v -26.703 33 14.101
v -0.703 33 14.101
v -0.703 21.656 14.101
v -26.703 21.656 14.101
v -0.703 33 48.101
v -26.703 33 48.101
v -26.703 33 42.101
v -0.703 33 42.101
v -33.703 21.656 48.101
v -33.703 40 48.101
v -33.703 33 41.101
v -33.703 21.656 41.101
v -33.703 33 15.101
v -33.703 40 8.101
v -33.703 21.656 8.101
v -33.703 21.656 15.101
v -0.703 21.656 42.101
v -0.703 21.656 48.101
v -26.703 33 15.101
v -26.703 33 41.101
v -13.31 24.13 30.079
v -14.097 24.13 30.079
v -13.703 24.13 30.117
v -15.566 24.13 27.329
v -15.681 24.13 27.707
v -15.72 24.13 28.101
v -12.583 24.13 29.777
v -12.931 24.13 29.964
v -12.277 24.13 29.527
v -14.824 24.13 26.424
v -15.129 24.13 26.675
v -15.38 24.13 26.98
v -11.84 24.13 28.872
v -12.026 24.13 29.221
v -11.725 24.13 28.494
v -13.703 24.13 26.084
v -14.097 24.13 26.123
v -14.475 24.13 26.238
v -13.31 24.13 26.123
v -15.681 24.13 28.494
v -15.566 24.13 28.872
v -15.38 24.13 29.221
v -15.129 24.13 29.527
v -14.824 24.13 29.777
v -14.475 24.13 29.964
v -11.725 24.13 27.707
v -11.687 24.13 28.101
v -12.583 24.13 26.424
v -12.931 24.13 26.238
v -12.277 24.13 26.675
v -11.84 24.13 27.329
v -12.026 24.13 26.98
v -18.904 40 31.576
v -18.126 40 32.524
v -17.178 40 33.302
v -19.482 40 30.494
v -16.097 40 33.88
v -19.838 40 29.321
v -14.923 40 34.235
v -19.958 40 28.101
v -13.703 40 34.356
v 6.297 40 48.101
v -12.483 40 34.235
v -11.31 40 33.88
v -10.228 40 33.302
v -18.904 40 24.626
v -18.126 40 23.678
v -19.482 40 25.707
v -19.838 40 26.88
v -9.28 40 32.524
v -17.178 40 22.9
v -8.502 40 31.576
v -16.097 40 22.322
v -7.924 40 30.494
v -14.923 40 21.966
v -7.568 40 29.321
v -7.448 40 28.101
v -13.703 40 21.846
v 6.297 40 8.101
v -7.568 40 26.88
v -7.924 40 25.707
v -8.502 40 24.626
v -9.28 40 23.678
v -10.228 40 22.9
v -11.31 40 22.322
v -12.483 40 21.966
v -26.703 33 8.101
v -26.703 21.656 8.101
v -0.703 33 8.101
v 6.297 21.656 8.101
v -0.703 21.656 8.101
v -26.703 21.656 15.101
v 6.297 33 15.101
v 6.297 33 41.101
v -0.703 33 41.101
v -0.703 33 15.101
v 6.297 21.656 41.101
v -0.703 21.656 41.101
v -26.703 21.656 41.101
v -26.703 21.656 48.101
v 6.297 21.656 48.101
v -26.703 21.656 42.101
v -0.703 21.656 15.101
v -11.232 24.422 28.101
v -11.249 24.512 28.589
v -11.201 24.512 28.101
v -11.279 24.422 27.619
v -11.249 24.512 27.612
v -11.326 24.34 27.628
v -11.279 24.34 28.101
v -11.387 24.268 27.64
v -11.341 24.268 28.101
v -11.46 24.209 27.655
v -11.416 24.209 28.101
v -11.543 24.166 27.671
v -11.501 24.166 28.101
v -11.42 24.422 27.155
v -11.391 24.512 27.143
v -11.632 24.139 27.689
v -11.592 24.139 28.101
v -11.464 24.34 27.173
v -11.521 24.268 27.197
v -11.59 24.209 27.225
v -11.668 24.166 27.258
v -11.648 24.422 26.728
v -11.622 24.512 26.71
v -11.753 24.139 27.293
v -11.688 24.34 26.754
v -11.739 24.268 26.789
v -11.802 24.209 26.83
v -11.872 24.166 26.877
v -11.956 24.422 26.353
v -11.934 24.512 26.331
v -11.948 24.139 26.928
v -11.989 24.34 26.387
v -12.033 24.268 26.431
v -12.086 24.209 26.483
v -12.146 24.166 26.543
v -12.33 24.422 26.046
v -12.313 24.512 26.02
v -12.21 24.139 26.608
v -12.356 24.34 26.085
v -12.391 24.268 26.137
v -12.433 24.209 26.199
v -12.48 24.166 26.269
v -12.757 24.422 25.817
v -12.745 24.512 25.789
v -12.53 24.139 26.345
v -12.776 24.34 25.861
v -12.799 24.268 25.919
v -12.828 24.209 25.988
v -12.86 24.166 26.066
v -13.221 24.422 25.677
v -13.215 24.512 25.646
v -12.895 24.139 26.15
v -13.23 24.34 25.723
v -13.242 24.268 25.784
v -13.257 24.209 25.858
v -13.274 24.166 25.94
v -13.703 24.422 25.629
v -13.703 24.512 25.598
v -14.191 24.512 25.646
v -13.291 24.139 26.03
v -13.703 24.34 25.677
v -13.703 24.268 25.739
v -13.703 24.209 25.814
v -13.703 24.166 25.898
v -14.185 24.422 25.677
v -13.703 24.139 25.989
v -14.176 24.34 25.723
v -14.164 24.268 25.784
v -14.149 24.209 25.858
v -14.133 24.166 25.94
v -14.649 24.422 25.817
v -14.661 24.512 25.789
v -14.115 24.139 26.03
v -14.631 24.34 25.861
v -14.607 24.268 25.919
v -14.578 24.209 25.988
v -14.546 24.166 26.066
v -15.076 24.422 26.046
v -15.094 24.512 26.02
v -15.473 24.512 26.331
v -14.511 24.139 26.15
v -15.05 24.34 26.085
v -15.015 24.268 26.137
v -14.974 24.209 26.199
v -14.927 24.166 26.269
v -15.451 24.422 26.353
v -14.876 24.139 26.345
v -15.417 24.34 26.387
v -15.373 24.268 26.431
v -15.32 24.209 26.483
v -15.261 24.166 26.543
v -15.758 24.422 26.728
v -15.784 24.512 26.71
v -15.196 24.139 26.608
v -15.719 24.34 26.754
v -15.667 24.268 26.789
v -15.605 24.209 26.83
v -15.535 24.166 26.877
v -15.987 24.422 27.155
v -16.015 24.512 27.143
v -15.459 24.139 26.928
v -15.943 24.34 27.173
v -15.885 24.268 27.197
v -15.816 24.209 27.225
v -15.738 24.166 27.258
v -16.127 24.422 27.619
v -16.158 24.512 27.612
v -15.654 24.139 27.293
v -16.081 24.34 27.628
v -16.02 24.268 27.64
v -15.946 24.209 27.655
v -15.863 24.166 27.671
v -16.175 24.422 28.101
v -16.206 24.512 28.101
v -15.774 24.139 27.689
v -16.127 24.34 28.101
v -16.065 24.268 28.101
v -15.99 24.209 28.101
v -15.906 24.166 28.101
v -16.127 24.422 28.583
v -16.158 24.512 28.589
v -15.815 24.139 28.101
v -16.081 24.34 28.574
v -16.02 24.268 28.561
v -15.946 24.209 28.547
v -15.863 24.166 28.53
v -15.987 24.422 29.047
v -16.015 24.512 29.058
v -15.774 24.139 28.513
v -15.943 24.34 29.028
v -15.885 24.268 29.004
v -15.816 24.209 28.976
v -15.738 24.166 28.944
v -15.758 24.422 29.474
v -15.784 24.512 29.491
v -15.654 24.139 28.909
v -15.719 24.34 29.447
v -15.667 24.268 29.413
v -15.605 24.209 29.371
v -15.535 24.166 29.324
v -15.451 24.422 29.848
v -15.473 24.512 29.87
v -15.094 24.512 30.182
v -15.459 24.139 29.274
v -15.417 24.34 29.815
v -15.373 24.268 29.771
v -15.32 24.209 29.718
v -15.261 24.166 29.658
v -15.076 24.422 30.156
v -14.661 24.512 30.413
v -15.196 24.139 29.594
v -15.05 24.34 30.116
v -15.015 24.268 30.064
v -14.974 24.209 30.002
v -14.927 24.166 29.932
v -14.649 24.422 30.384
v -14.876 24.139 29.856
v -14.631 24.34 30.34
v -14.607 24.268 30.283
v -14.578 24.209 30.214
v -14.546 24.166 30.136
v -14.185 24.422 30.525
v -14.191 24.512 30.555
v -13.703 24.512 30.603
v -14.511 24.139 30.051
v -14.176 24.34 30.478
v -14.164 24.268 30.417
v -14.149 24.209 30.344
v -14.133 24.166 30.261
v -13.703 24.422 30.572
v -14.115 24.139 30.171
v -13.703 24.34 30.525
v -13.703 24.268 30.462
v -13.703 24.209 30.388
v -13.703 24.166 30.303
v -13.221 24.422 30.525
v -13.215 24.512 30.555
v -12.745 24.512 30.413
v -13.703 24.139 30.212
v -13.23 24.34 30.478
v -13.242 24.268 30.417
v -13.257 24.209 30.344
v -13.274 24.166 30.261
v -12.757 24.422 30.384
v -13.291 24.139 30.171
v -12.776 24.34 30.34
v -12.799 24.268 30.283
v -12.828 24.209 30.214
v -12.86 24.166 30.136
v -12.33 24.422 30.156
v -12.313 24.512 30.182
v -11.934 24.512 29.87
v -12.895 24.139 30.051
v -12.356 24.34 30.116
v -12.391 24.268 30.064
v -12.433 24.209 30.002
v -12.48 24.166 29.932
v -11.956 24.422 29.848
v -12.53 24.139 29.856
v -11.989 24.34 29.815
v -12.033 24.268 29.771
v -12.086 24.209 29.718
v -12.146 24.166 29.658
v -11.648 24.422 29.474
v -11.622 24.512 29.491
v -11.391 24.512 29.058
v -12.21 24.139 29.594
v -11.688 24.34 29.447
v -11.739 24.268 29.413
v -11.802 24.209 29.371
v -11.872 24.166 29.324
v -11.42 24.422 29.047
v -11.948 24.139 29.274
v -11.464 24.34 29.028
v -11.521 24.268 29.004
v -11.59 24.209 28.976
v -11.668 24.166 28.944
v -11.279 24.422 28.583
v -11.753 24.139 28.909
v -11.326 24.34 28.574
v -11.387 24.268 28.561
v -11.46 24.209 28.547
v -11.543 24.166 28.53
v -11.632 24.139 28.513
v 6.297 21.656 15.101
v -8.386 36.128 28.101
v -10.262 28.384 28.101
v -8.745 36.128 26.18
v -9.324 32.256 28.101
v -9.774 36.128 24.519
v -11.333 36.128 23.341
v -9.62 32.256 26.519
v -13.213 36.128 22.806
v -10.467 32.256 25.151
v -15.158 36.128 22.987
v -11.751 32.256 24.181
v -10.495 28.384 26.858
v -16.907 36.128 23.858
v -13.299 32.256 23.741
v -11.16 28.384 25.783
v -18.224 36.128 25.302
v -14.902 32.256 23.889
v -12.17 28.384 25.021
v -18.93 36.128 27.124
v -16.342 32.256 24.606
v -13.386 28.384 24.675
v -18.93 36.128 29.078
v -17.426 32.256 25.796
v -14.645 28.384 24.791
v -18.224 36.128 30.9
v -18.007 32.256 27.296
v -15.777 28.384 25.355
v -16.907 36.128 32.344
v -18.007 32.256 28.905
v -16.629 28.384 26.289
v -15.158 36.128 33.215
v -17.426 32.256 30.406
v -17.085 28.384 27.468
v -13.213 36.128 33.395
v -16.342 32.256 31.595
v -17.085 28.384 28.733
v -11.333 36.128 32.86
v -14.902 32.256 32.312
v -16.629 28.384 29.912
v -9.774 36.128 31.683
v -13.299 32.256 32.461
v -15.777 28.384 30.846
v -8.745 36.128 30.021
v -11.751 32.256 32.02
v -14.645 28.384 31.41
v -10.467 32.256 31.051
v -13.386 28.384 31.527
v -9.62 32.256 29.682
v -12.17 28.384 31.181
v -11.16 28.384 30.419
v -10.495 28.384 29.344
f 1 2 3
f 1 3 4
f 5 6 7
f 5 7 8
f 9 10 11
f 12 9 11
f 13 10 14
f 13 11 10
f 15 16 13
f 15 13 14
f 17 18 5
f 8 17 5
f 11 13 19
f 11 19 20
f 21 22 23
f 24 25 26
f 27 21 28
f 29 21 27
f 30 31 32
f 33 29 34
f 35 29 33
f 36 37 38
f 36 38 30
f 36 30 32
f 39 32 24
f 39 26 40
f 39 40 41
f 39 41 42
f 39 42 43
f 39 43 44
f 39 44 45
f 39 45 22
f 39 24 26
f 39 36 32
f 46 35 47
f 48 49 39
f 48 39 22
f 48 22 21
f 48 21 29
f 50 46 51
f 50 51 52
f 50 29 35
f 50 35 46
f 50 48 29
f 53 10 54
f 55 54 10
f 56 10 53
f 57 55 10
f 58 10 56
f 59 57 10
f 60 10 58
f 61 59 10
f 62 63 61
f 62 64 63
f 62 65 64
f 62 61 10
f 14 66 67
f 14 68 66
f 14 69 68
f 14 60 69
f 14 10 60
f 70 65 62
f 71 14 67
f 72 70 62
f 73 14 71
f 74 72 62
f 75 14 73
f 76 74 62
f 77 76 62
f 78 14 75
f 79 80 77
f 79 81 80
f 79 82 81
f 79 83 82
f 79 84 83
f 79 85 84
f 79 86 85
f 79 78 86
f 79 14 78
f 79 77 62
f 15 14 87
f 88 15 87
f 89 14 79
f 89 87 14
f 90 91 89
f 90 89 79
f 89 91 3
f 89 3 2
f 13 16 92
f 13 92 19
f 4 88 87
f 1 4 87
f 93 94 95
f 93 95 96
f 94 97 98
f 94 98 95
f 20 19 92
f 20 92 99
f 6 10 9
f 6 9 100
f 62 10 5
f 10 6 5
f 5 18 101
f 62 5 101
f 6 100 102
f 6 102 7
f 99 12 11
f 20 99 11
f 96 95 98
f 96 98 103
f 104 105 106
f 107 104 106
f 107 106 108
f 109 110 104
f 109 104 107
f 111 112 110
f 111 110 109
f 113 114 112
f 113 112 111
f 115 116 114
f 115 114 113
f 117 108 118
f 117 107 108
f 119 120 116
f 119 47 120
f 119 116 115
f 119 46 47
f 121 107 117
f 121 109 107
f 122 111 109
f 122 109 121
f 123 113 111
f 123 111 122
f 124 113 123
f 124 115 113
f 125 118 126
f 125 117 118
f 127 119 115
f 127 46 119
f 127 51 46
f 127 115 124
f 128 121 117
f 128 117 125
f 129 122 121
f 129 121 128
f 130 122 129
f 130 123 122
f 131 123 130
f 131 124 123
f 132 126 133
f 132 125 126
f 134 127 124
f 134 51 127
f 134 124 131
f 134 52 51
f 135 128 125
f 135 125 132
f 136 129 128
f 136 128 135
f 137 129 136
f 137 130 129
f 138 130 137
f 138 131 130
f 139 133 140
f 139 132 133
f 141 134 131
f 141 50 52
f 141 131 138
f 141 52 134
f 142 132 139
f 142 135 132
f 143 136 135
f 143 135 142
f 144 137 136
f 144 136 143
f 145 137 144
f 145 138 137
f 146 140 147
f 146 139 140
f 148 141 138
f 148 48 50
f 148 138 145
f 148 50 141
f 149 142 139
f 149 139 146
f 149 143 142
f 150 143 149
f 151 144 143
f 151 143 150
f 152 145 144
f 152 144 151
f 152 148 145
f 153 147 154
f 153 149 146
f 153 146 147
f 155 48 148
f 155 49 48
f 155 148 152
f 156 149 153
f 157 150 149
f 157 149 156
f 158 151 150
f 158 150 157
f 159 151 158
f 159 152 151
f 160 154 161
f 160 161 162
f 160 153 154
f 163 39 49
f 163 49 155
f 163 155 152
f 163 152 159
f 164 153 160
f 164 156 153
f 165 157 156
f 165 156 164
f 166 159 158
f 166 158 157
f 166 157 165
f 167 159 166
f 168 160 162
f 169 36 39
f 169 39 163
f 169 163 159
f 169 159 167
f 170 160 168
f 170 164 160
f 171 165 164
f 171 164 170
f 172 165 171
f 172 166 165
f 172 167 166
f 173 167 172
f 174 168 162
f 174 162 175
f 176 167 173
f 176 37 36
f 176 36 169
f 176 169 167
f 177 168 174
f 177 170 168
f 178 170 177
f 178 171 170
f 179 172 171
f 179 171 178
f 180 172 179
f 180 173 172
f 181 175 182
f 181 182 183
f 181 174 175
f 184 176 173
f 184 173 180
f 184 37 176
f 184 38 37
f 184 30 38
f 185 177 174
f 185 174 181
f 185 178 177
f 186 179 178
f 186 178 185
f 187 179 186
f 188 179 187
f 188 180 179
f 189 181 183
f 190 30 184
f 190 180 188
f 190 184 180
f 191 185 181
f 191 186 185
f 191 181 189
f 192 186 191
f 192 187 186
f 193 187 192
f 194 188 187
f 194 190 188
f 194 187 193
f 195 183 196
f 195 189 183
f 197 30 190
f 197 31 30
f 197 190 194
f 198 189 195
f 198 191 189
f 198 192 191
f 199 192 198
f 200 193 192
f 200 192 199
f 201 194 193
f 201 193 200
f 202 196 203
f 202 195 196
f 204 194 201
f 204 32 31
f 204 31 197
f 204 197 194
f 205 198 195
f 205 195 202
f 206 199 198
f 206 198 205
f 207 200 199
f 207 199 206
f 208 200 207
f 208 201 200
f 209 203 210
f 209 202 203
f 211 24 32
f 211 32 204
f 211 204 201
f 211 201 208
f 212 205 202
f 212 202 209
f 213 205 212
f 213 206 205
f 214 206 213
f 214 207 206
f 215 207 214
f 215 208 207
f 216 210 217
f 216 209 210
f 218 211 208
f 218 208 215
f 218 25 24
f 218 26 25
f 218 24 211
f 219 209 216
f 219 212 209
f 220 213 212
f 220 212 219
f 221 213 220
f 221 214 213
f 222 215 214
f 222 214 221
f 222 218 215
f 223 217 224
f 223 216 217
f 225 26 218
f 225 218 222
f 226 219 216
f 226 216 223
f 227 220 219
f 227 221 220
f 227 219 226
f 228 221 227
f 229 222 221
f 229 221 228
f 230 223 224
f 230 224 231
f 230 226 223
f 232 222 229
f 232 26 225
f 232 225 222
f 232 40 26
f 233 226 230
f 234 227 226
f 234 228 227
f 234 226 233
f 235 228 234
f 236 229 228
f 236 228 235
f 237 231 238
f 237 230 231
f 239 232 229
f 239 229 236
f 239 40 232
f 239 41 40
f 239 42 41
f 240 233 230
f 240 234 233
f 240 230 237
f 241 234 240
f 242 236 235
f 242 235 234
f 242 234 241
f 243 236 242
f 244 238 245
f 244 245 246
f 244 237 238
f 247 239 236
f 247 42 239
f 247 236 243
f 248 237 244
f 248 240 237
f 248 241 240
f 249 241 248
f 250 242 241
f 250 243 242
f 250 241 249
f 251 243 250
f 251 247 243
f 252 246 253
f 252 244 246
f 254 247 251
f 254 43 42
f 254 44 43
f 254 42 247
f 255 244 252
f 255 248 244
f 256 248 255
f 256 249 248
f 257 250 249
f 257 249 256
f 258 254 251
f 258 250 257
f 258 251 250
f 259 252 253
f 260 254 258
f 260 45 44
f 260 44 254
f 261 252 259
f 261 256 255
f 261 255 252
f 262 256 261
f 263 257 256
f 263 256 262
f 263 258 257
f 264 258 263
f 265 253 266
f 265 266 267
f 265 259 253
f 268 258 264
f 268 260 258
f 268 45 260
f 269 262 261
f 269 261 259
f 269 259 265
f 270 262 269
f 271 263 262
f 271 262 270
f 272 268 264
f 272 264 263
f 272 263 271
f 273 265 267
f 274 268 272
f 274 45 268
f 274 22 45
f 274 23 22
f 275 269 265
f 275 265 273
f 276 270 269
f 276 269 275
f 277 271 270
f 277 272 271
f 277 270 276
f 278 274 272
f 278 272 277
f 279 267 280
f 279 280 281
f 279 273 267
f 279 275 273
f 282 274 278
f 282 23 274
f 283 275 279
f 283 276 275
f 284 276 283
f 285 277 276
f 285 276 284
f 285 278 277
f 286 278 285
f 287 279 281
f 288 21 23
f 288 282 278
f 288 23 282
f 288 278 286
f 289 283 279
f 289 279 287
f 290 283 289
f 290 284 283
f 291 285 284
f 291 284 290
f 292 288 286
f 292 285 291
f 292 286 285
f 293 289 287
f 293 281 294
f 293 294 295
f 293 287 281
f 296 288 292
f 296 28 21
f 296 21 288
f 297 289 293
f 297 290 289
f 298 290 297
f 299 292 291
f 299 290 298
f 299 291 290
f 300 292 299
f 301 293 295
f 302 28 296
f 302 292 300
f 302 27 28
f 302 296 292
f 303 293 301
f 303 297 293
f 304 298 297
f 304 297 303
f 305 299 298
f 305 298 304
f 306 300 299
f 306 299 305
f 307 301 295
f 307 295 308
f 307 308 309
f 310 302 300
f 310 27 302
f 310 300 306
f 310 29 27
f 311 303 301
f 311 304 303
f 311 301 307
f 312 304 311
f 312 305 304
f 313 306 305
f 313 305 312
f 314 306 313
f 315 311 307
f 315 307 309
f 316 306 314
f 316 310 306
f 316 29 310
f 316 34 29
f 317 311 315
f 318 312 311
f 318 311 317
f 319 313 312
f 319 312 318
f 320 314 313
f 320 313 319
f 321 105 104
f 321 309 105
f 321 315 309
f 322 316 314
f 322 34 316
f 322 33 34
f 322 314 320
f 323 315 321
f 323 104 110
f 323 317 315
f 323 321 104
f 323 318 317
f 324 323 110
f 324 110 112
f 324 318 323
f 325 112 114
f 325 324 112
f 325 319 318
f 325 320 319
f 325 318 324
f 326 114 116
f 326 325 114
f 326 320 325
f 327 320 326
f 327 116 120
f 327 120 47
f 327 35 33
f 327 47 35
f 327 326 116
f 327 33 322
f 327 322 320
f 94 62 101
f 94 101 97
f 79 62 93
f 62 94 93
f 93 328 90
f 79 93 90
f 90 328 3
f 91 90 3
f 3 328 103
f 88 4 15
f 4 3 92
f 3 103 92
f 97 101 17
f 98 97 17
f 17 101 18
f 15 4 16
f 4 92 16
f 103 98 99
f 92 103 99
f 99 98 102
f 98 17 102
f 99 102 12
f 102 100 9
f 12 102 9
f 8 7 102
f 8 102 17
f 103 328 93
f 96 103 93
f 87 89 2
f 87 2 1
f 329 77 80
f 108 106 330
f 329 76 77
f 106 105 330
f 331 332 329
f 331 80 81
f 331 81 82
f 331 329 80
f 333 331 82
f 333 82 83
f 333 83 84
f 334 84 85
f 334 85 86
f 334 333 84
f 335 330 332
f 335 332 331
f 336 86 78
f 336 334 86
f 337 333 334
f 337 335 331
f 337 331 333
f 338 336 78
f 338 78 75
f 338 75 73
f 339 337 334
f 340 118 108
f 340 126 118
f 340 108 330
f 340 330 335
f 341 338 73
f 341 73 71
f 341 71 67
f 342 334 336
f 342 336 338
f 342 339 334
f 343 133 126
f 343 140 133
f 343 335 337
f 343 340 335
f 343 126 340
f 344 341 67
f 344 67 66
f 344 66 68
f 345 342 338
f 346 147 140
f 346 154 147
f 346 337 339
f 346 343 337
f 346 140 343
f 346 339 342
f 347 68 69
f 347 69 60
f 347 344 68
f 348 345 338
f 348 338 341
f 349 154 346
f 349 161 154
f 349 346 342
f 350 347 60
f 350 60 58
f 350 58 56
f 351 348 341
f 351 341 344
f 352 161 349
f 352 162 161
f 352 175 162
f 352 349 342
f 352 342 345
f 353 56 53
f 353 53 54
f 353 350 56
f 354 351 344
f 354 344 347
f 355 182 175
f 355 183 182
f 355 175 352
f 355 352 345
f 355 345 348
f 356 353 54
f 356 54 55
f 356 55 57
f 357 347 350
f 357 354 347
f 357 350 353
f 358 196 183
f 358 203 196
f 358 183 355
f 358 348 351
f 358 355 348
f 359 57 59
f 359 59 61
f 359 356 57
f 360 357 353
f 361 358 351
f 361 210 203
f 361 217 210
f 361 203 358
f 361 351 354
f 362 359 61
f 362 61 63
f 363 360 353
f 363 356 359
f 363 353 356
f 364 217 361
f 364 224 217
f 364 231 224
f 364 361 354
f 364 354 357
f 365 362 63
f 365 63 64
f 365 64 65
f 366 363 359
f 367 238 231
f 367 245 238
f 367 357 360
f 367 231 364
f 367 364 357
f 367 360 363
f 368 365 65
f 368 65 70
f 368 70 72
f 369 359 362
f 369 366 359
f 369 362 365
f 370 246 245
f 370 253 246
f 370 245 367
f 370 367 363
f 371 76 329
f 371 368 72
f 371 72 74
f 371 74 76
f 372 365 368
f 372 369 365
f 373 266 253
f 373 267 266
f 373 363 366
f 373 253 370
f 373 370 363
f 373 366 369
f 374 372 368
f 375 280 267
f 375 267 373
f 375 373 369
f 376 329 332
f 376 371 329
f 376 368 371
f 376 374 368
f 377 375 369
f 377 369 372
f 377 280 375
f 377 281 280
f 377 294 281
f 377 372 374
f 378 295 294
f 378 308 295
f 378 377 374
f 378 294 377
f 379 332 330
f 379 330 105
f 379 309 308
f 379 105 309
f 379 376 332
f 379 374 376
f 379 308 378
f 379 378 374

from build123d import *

# Parameters (mm, degrees)
ESBO_O1_W                  = 40
ESBO_O1_H                  = 40
RESSALTO_EXTRUS_O1_DEPTH   = 40
ESBO_O10_W                 = 26
ESBO_O10_H                 = 26
CORTE_EXTRUS_O3_DEPTH      = 7
ESBO_O11_W                 = 26
ESBO_O11_H                 = 26
CORTE_EXTRUS_O6_DEPTH      = 6
ESBO_O12_W                 = 26
ESBO_O12_H                 = 26
CORTE_EXTRUS_O7_DEPTH      = 6
ESBO_O13_W                 = 26
ESBO_O13_H                 = 26
CORTE_EXTRUS_O8_DEPTH      = 7
ESBO_O2_R                  = 6.255
ESBO_O4_R                  = 2.41
FILETE2_R                  = 0.5
CORTE_EXTRUS_O9_DEPTH      = 37
CORTE_EXTRUS_O9_DEPTH_BACK = 37
ESBO_O14_W                 = 40
ESBO_O14_H                 = 21.655550529


with BuildPart() as part:
    # Esboço1 → Ressalto-extrusão1 (new body)
    with BuildSketch(Plane(origin=(0, 0, 0), x_dir=(1, 0, 0), z_dir=(0, 1, 0))):
        with Locations((-13.703200382, -28.10068404)):
            Rectangle(ESBO_O1_W, ESBO_O1_H)
    extrude(amount=RESSALTO_EXTRUS_O1_DEPTH)

    # Esboço10 → Corte-extrusão3 (cut)
    with BuildSketch(Plane.ZY.offset(33.703200382)):
        with Locations((28.10068404, 20)):
            Rectangle(ESBO_O10_W, ESBO_O10_H)
    extrude(amount=-CORTE_EXTRUS_O3_DEPTH, mode=Mode.SUBTRACT)

    # Esboço11 → Corte-extrusão6 (cut)
    with BuildSketch(Plane(origin=(0, 0, 8.10068404), x_dir=(-1, 0, 0), z_dir=(0, 0, -1))):
        with Locations((13.703200382, 20)):
            Rectangle(ESBO_O11_W, ESBO_O11_H)
    extrude(amount=-CORTE_EXTRUS_O6_DEPTH, mode=Mode.SUBTRACT)

    # Esboço12 → Corte-extrusão7 (cut)
    with BuildSketch(Plane.XY.offset(48.10068404)):
        with Locations((-13.703200382, 20)):
            Rectangle(ESBO_O12_W, ESBO_O12_H)
    extrude(amount=-CORTE_EXTRUS_O7_DEPTH, mode=Mode.SUBTRACT)

    # Esboço13 → Corte-extrusão8 (cut)
    with BuildSketch(Plane(origin=(6.296799618, 0, 0), x_dir=(0, 0, -1), z_dir=(1, 0, 0))):
        with Locations((-28.10068404, 20)):
            Rectangle(ESBO_O13_W, ESBO_O13_H)
    extrude(amount=-CORTE_EXTRUS_O8_DEPTH, mode=Mode.SUBTRACT)

    # Esboço2 → Loft de corte2 section 0
    with BuildSketch(Plane(origin=(0, 40, 0), x_dir=(1, 0, 0), z_dir=(0, 1, 0))):
        with Locations((-13.703200382, -28.10068404)):
            Circle(ESBO_O2_R)
    # Esboço4 → Loft de corte2 section 1
    with BuildSketch(Plane(origin=(0, 24.13, 0), x_dir=(1, 0, 0), z_dir=(0, 1, 0))):
        with Locations((-13.703200382, -28.10068404)):
            Circle(ESBO_O4_R)
    loft(mode=Mode.SUBTRACT)

    # Filete2
    filete2_edges = [part.edges().sort_by_distance(p)[0] for p in [
        (-16.113200382, 24.13, 28.10068404),
    ]]
    fillet(filete2_edges, radius=FILETE2_R)

    # Esboço14 → Corte-extrusão9 (cut, two sides: drawn at the far end of the back side and taken through both)
    with BuildSketch(Plane(origin=(0, 0, 14.10068404), x_dir=(-1, 0, 0), z_dir=(0, 0, -1)).offset(-CORTE_EXTRUS_O9_DEPTH_BACK)):
        with Locations((13.703200382, 10.827775265)):
            Rectangle(ESBO_O14_W, ESBO_O14_H)
    extrude(amount=CORTE_EXTRUS_O9_DEPTH + CORTE_EXTRUS_O9_DEPTH_BACK, mode=Mode.SUBTRACT)


solid = part.part
